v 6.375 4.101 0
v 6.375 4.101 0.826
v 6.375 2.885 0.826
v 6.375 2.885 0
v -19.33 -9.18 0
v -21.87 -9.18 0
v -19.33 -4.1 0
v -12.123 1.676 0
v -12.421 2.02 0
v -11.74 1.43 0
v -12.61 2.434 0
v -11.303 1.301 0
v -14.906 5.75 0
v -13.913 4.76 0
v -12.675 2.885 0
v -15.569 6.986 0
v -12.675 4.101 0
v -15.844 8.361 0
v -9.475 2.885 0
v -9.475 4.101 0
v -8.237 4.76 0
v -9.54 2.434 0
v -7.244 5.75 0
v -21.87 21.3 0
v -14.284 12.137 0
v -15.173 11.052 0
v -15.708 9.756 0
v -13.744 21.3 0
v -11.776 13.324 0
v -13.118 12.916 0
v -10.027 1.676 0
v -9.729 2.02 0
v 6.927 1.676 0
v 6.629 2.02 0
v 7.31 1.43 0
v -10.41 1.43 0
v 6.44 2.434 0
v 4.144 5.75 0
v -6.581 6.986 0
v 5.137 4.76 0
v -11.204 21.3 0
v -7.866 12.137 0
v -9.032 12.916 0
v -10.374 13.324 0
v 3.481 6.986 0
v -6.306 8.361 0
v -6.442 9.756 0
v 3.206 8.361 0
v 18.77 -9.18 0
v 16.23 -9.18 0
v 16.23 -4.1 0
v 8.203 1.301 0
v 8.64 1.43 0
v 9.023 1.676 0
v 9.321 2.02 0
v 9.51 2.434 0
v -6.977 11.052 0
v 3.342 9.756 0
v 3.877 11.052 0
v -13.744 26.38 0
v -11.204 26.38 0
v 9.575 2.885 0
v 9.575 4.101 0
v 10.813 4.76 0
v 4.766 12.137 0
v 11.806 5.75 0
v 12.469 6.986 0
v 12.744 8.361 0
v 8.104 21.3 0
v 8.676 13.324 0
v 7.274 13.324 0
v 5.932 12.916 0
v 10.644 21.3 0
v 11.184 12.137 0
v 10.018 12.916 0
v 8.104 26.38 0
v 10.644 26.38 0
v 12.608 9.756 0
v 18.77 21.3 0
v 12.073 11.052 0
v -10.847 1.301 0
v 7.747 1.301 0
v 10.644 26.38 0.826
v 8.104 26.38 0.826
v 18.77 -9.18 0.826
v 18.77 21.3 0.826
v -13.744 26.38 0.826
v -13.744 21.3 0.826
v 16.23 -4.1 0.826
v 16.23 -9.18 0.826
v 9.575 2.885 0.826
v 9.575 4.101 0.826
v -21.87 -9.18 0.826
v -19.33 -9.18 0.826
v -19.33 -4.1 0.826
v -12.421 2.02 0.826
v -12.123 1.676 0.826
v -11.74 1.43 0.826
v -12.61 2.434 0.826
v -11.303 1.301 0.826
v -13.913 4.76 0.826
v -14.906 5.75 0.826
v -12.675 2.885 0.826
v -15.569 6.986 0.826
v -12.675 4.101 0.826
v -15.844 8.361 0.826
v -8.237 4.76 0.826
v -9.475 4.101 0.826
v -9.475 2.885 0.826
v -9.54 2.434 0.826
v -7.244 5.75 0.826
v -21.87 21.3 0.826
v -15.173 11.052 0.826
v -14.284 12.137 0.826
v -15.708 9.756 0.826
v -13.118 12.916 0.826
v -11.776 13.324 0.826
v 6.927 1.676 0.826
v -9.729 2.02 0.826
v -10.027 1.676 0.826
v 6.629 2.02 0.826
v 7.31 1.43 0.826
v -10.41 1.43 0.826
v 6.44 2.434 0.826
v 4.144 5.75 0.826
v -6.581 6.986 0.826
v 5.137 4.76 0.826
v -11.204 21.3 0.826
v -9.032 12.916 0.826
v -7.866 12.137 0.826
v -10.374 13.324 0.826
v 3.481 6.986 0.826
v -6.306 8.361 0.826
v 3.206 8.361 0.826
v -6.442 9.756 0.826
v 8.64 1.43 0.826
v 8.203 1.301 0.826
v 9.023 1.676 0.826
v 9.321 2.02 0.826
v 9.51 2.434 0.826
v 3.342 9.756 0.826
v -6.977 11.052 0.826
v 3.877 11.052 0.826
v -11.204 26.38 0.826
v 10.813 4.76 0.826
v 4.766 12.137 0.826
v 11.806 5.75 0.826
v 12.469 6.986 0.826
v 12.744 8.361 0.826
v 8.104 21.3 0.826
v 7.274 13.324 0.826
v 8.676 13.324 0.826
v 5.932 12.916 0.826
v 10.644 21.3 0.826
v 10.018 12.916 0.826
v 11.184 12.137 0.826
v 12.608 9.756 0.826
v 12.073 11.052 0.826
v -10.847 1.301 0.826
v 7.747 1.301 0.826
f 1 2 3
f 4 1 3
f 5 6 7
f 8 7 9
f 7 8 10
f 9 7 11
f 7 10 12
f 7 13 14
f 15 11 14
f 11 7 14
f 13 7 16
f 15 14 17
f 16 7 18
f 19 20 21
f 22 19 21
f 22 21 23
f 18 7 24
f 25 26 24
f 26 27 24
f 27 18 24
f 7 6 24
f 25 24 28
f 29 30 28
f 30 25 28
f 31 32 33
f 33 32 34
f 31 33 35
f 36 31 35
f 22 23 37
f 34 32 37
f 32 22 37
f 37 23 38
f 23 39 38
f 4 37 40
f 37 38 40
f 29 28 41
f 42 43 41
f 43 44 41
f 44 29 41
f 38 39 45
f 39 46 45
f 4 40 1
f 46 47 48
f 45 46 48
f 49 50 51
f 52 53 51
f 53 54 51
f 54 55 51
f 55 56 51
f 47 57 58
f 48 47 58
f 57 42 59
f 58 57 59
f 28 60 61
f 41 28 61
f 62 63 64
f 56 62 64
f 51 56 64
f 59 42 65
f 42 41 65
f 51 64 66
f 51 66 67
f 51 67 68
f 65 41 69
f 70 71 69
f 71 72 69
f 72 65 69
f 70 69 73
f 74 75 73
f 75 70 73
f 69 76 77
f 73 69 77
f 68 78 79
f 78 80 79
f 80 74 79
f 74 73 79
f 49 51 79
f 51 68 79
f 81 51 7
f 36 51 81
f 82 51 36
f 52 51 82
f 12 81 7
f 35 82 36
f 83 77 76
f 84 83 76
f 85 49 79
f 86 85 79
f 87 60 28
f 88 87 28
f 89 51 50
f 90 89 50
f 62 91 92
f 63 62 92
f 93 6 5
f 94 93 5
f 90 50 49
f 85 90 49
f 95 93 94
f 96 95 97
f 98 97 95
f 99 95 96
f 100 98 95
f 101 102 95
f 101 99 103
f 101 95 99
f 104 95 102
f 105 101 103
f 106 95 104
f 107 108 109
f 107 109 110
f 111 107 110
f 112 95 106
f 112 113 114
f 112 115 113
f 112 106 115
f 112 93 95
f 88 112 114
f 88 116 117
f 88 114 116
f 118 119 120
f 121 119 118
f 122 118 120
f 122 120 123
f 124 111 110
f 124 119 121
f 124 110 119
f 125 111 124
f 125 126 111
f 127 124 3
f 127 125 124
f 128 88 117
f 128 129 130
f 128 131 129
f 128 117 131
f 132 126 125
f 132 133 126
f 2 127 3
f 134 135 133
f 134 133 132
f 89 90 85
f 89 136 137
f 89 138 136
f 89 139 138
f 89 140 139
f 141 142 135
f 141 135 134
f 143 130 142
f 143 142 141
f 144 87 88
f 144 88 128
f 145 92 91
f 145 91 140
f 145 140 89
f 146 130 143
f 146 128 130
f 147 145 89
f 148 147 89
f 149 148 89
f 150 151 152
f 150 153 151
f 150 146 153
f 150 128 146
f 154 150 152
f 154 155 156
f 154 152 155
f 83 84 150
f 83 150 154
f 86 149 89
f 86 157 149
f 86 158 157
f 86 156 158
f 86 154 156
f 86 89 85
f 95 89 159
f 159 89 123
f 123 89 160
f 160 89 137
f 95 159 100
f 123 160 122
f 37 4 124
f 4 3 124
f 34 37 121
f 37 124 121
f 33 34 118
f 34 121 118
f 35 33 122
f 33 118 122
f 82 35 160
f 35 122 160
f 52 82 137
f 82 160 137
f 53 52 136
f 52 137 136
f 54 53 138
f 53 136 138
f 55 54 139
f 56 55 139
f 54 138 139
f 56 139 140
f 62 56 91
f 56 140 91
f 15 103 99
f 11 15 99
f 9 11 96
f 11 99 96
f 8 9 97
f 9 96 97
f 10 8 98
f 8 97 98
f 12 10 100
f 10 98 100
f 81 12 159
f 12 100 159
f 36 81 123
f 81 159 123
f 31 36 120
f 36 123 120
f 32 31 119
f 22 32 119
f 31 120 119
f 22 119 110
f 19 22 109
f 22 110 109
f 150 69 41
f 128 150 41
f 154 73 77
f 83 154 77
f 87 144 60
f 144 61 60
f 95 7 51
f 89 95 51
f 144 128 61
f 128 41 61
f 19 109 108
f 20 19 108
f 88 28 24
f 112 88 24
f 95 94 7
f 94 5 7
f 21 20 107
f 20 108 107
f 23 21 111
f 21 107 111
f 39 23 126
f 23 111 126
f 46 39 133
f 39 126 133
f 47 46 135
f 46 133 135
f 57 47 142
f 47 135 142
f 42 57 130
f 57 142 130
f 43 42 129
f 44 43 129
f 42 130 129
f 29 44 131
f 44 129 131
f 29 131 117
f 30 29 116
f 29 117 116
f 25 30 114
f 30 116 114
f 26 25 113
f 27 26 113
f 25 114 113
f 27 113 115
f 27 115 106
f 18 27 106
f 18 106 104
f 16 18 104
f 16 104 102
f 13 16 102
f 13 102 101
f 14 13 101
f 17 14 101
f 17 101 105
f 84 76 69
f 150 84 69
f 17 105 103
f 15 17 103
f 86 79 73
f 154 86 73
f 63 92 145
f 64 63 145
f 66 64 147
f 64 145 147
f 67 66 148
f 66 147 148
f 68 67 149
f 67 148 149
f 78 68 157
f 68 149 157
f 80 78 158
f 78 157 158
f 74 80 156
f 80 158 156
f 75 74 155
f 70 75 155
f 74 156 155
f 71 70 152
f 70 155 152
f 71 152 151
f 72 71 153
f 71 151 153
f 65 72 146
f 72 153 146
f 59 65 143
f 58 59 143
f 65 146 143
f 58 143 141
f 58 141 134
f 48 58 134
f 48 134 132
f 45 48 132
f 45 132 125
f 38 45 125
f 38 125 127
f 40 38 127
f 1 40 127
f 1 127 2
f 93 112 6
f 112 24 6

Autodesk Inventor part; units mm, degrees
ref_plane "YZ Plane" through (0, 0, 0) normal (1, 0, 0) x (0, 1, 0)
ref_plane "XZ Plane" through (0, 0, 0) normal (0, 1, 0) x (-1, 0, 0)
ref_plane "XY Plane" through (0, 0, 0) normal (0, 0, 1) x (1, 0, 0)
sketch "Sketch1" plane through (0, 0, 0) normal (0, 0, 1) x (1, 0, 0)
  line L0 (-21.87, 21.3003) -> (-21.87, -9.1797)
  line L1 (-21.87, -9.1797) -> (-19.33, -9.1797)
  line L2 (-19.33, -9.1797) -> (-19.33, -4.0997)
  line L3 (-19.33, -4.0997) -> (16.23, -4.0997)
  line L4 (16.23, -4.0997) -> (16.23, -9.1797)
  line L5 (16.23, -9.1797) -> (18.77, -9.1797)
  line L6 (18.77, -9.1797) -> (18.77, 21.3003)
  line L7 (18.77, 21.3003) -> (10.6439, 21.3003)
  line L8 (10.6439, 21.3003) -> (10.6439, 26.3803)
  line L9 (10.6439, 26.3803) -> (8.1039, 26.3803)
  line L10 (8.1039, 26.3803) -> (8.1039, 21.3003)
  line L11 (8.1039, 21.3003) -> (-11.2039, 21.3003)
  line L12 (-11.2039, 21.3003) -> (-11.2039, 26.3803)
  line L13 (-11.2039, 26.3803) -> (-13.7439, 26.3803)
  line L14 (-13.7439, 26.3803) -> (-13.7439, 21.3003)
  line L15 (-13.7439, 21.3003) -> (-21.87, 21.3003)
  dimension "d0" = 40.64
  dimension "d1" = 25.4
  dimension "d2" = 5.08
  dimension "d3" = 2.54
  dimension "d5" = 5.08
  dimension "d18" = 2.54
extrude "Extrusion1" add sketch "Sketch1" along normal blind 0.8255
sketch "Sketch2" plane through (0, 0, 0.8255) normal (0, 0, 1) x (1, 0, 0)
  line L0 (-13.7439, 21.3003) -> (-13.7439, 26.3803) projected
  arc A0 (-9.4748, 4.1012) -> (-12.6752, 4.1012) centre (-11.075, 8.6003) ccw
  line L1 (-12.6752, 4.1012) -> (-12.6752, 2.8853)
  arc A1 (-12.6752, 2.8853) -> (-9.4748, 2.8853) centre (-11.075, 2.8853) ccw
  line L2 (-9.4748, 2.8853) -> (-9.4748, 4.1012)
  line L3 (-21.87, -9.1797) -> (-21.87, 21.3003) projected
  point P0 (-19.33, -4.0997)
  dimension "d8" = 5.715
  dimension "d9" = 4.7752
  dimension "d10" = 1.6002
  dimension "d16" = 10.795
  dimension "d17" = 12.7
extrude "Extrusion2" cut sketch "Sketch2" against normal blind 0.8255
pattern_linear "Rectangular Pattern1" count 2 spacing 19.05 along (1, 0, 0) of "Extrusion2"
properties part number "adaptplate"
